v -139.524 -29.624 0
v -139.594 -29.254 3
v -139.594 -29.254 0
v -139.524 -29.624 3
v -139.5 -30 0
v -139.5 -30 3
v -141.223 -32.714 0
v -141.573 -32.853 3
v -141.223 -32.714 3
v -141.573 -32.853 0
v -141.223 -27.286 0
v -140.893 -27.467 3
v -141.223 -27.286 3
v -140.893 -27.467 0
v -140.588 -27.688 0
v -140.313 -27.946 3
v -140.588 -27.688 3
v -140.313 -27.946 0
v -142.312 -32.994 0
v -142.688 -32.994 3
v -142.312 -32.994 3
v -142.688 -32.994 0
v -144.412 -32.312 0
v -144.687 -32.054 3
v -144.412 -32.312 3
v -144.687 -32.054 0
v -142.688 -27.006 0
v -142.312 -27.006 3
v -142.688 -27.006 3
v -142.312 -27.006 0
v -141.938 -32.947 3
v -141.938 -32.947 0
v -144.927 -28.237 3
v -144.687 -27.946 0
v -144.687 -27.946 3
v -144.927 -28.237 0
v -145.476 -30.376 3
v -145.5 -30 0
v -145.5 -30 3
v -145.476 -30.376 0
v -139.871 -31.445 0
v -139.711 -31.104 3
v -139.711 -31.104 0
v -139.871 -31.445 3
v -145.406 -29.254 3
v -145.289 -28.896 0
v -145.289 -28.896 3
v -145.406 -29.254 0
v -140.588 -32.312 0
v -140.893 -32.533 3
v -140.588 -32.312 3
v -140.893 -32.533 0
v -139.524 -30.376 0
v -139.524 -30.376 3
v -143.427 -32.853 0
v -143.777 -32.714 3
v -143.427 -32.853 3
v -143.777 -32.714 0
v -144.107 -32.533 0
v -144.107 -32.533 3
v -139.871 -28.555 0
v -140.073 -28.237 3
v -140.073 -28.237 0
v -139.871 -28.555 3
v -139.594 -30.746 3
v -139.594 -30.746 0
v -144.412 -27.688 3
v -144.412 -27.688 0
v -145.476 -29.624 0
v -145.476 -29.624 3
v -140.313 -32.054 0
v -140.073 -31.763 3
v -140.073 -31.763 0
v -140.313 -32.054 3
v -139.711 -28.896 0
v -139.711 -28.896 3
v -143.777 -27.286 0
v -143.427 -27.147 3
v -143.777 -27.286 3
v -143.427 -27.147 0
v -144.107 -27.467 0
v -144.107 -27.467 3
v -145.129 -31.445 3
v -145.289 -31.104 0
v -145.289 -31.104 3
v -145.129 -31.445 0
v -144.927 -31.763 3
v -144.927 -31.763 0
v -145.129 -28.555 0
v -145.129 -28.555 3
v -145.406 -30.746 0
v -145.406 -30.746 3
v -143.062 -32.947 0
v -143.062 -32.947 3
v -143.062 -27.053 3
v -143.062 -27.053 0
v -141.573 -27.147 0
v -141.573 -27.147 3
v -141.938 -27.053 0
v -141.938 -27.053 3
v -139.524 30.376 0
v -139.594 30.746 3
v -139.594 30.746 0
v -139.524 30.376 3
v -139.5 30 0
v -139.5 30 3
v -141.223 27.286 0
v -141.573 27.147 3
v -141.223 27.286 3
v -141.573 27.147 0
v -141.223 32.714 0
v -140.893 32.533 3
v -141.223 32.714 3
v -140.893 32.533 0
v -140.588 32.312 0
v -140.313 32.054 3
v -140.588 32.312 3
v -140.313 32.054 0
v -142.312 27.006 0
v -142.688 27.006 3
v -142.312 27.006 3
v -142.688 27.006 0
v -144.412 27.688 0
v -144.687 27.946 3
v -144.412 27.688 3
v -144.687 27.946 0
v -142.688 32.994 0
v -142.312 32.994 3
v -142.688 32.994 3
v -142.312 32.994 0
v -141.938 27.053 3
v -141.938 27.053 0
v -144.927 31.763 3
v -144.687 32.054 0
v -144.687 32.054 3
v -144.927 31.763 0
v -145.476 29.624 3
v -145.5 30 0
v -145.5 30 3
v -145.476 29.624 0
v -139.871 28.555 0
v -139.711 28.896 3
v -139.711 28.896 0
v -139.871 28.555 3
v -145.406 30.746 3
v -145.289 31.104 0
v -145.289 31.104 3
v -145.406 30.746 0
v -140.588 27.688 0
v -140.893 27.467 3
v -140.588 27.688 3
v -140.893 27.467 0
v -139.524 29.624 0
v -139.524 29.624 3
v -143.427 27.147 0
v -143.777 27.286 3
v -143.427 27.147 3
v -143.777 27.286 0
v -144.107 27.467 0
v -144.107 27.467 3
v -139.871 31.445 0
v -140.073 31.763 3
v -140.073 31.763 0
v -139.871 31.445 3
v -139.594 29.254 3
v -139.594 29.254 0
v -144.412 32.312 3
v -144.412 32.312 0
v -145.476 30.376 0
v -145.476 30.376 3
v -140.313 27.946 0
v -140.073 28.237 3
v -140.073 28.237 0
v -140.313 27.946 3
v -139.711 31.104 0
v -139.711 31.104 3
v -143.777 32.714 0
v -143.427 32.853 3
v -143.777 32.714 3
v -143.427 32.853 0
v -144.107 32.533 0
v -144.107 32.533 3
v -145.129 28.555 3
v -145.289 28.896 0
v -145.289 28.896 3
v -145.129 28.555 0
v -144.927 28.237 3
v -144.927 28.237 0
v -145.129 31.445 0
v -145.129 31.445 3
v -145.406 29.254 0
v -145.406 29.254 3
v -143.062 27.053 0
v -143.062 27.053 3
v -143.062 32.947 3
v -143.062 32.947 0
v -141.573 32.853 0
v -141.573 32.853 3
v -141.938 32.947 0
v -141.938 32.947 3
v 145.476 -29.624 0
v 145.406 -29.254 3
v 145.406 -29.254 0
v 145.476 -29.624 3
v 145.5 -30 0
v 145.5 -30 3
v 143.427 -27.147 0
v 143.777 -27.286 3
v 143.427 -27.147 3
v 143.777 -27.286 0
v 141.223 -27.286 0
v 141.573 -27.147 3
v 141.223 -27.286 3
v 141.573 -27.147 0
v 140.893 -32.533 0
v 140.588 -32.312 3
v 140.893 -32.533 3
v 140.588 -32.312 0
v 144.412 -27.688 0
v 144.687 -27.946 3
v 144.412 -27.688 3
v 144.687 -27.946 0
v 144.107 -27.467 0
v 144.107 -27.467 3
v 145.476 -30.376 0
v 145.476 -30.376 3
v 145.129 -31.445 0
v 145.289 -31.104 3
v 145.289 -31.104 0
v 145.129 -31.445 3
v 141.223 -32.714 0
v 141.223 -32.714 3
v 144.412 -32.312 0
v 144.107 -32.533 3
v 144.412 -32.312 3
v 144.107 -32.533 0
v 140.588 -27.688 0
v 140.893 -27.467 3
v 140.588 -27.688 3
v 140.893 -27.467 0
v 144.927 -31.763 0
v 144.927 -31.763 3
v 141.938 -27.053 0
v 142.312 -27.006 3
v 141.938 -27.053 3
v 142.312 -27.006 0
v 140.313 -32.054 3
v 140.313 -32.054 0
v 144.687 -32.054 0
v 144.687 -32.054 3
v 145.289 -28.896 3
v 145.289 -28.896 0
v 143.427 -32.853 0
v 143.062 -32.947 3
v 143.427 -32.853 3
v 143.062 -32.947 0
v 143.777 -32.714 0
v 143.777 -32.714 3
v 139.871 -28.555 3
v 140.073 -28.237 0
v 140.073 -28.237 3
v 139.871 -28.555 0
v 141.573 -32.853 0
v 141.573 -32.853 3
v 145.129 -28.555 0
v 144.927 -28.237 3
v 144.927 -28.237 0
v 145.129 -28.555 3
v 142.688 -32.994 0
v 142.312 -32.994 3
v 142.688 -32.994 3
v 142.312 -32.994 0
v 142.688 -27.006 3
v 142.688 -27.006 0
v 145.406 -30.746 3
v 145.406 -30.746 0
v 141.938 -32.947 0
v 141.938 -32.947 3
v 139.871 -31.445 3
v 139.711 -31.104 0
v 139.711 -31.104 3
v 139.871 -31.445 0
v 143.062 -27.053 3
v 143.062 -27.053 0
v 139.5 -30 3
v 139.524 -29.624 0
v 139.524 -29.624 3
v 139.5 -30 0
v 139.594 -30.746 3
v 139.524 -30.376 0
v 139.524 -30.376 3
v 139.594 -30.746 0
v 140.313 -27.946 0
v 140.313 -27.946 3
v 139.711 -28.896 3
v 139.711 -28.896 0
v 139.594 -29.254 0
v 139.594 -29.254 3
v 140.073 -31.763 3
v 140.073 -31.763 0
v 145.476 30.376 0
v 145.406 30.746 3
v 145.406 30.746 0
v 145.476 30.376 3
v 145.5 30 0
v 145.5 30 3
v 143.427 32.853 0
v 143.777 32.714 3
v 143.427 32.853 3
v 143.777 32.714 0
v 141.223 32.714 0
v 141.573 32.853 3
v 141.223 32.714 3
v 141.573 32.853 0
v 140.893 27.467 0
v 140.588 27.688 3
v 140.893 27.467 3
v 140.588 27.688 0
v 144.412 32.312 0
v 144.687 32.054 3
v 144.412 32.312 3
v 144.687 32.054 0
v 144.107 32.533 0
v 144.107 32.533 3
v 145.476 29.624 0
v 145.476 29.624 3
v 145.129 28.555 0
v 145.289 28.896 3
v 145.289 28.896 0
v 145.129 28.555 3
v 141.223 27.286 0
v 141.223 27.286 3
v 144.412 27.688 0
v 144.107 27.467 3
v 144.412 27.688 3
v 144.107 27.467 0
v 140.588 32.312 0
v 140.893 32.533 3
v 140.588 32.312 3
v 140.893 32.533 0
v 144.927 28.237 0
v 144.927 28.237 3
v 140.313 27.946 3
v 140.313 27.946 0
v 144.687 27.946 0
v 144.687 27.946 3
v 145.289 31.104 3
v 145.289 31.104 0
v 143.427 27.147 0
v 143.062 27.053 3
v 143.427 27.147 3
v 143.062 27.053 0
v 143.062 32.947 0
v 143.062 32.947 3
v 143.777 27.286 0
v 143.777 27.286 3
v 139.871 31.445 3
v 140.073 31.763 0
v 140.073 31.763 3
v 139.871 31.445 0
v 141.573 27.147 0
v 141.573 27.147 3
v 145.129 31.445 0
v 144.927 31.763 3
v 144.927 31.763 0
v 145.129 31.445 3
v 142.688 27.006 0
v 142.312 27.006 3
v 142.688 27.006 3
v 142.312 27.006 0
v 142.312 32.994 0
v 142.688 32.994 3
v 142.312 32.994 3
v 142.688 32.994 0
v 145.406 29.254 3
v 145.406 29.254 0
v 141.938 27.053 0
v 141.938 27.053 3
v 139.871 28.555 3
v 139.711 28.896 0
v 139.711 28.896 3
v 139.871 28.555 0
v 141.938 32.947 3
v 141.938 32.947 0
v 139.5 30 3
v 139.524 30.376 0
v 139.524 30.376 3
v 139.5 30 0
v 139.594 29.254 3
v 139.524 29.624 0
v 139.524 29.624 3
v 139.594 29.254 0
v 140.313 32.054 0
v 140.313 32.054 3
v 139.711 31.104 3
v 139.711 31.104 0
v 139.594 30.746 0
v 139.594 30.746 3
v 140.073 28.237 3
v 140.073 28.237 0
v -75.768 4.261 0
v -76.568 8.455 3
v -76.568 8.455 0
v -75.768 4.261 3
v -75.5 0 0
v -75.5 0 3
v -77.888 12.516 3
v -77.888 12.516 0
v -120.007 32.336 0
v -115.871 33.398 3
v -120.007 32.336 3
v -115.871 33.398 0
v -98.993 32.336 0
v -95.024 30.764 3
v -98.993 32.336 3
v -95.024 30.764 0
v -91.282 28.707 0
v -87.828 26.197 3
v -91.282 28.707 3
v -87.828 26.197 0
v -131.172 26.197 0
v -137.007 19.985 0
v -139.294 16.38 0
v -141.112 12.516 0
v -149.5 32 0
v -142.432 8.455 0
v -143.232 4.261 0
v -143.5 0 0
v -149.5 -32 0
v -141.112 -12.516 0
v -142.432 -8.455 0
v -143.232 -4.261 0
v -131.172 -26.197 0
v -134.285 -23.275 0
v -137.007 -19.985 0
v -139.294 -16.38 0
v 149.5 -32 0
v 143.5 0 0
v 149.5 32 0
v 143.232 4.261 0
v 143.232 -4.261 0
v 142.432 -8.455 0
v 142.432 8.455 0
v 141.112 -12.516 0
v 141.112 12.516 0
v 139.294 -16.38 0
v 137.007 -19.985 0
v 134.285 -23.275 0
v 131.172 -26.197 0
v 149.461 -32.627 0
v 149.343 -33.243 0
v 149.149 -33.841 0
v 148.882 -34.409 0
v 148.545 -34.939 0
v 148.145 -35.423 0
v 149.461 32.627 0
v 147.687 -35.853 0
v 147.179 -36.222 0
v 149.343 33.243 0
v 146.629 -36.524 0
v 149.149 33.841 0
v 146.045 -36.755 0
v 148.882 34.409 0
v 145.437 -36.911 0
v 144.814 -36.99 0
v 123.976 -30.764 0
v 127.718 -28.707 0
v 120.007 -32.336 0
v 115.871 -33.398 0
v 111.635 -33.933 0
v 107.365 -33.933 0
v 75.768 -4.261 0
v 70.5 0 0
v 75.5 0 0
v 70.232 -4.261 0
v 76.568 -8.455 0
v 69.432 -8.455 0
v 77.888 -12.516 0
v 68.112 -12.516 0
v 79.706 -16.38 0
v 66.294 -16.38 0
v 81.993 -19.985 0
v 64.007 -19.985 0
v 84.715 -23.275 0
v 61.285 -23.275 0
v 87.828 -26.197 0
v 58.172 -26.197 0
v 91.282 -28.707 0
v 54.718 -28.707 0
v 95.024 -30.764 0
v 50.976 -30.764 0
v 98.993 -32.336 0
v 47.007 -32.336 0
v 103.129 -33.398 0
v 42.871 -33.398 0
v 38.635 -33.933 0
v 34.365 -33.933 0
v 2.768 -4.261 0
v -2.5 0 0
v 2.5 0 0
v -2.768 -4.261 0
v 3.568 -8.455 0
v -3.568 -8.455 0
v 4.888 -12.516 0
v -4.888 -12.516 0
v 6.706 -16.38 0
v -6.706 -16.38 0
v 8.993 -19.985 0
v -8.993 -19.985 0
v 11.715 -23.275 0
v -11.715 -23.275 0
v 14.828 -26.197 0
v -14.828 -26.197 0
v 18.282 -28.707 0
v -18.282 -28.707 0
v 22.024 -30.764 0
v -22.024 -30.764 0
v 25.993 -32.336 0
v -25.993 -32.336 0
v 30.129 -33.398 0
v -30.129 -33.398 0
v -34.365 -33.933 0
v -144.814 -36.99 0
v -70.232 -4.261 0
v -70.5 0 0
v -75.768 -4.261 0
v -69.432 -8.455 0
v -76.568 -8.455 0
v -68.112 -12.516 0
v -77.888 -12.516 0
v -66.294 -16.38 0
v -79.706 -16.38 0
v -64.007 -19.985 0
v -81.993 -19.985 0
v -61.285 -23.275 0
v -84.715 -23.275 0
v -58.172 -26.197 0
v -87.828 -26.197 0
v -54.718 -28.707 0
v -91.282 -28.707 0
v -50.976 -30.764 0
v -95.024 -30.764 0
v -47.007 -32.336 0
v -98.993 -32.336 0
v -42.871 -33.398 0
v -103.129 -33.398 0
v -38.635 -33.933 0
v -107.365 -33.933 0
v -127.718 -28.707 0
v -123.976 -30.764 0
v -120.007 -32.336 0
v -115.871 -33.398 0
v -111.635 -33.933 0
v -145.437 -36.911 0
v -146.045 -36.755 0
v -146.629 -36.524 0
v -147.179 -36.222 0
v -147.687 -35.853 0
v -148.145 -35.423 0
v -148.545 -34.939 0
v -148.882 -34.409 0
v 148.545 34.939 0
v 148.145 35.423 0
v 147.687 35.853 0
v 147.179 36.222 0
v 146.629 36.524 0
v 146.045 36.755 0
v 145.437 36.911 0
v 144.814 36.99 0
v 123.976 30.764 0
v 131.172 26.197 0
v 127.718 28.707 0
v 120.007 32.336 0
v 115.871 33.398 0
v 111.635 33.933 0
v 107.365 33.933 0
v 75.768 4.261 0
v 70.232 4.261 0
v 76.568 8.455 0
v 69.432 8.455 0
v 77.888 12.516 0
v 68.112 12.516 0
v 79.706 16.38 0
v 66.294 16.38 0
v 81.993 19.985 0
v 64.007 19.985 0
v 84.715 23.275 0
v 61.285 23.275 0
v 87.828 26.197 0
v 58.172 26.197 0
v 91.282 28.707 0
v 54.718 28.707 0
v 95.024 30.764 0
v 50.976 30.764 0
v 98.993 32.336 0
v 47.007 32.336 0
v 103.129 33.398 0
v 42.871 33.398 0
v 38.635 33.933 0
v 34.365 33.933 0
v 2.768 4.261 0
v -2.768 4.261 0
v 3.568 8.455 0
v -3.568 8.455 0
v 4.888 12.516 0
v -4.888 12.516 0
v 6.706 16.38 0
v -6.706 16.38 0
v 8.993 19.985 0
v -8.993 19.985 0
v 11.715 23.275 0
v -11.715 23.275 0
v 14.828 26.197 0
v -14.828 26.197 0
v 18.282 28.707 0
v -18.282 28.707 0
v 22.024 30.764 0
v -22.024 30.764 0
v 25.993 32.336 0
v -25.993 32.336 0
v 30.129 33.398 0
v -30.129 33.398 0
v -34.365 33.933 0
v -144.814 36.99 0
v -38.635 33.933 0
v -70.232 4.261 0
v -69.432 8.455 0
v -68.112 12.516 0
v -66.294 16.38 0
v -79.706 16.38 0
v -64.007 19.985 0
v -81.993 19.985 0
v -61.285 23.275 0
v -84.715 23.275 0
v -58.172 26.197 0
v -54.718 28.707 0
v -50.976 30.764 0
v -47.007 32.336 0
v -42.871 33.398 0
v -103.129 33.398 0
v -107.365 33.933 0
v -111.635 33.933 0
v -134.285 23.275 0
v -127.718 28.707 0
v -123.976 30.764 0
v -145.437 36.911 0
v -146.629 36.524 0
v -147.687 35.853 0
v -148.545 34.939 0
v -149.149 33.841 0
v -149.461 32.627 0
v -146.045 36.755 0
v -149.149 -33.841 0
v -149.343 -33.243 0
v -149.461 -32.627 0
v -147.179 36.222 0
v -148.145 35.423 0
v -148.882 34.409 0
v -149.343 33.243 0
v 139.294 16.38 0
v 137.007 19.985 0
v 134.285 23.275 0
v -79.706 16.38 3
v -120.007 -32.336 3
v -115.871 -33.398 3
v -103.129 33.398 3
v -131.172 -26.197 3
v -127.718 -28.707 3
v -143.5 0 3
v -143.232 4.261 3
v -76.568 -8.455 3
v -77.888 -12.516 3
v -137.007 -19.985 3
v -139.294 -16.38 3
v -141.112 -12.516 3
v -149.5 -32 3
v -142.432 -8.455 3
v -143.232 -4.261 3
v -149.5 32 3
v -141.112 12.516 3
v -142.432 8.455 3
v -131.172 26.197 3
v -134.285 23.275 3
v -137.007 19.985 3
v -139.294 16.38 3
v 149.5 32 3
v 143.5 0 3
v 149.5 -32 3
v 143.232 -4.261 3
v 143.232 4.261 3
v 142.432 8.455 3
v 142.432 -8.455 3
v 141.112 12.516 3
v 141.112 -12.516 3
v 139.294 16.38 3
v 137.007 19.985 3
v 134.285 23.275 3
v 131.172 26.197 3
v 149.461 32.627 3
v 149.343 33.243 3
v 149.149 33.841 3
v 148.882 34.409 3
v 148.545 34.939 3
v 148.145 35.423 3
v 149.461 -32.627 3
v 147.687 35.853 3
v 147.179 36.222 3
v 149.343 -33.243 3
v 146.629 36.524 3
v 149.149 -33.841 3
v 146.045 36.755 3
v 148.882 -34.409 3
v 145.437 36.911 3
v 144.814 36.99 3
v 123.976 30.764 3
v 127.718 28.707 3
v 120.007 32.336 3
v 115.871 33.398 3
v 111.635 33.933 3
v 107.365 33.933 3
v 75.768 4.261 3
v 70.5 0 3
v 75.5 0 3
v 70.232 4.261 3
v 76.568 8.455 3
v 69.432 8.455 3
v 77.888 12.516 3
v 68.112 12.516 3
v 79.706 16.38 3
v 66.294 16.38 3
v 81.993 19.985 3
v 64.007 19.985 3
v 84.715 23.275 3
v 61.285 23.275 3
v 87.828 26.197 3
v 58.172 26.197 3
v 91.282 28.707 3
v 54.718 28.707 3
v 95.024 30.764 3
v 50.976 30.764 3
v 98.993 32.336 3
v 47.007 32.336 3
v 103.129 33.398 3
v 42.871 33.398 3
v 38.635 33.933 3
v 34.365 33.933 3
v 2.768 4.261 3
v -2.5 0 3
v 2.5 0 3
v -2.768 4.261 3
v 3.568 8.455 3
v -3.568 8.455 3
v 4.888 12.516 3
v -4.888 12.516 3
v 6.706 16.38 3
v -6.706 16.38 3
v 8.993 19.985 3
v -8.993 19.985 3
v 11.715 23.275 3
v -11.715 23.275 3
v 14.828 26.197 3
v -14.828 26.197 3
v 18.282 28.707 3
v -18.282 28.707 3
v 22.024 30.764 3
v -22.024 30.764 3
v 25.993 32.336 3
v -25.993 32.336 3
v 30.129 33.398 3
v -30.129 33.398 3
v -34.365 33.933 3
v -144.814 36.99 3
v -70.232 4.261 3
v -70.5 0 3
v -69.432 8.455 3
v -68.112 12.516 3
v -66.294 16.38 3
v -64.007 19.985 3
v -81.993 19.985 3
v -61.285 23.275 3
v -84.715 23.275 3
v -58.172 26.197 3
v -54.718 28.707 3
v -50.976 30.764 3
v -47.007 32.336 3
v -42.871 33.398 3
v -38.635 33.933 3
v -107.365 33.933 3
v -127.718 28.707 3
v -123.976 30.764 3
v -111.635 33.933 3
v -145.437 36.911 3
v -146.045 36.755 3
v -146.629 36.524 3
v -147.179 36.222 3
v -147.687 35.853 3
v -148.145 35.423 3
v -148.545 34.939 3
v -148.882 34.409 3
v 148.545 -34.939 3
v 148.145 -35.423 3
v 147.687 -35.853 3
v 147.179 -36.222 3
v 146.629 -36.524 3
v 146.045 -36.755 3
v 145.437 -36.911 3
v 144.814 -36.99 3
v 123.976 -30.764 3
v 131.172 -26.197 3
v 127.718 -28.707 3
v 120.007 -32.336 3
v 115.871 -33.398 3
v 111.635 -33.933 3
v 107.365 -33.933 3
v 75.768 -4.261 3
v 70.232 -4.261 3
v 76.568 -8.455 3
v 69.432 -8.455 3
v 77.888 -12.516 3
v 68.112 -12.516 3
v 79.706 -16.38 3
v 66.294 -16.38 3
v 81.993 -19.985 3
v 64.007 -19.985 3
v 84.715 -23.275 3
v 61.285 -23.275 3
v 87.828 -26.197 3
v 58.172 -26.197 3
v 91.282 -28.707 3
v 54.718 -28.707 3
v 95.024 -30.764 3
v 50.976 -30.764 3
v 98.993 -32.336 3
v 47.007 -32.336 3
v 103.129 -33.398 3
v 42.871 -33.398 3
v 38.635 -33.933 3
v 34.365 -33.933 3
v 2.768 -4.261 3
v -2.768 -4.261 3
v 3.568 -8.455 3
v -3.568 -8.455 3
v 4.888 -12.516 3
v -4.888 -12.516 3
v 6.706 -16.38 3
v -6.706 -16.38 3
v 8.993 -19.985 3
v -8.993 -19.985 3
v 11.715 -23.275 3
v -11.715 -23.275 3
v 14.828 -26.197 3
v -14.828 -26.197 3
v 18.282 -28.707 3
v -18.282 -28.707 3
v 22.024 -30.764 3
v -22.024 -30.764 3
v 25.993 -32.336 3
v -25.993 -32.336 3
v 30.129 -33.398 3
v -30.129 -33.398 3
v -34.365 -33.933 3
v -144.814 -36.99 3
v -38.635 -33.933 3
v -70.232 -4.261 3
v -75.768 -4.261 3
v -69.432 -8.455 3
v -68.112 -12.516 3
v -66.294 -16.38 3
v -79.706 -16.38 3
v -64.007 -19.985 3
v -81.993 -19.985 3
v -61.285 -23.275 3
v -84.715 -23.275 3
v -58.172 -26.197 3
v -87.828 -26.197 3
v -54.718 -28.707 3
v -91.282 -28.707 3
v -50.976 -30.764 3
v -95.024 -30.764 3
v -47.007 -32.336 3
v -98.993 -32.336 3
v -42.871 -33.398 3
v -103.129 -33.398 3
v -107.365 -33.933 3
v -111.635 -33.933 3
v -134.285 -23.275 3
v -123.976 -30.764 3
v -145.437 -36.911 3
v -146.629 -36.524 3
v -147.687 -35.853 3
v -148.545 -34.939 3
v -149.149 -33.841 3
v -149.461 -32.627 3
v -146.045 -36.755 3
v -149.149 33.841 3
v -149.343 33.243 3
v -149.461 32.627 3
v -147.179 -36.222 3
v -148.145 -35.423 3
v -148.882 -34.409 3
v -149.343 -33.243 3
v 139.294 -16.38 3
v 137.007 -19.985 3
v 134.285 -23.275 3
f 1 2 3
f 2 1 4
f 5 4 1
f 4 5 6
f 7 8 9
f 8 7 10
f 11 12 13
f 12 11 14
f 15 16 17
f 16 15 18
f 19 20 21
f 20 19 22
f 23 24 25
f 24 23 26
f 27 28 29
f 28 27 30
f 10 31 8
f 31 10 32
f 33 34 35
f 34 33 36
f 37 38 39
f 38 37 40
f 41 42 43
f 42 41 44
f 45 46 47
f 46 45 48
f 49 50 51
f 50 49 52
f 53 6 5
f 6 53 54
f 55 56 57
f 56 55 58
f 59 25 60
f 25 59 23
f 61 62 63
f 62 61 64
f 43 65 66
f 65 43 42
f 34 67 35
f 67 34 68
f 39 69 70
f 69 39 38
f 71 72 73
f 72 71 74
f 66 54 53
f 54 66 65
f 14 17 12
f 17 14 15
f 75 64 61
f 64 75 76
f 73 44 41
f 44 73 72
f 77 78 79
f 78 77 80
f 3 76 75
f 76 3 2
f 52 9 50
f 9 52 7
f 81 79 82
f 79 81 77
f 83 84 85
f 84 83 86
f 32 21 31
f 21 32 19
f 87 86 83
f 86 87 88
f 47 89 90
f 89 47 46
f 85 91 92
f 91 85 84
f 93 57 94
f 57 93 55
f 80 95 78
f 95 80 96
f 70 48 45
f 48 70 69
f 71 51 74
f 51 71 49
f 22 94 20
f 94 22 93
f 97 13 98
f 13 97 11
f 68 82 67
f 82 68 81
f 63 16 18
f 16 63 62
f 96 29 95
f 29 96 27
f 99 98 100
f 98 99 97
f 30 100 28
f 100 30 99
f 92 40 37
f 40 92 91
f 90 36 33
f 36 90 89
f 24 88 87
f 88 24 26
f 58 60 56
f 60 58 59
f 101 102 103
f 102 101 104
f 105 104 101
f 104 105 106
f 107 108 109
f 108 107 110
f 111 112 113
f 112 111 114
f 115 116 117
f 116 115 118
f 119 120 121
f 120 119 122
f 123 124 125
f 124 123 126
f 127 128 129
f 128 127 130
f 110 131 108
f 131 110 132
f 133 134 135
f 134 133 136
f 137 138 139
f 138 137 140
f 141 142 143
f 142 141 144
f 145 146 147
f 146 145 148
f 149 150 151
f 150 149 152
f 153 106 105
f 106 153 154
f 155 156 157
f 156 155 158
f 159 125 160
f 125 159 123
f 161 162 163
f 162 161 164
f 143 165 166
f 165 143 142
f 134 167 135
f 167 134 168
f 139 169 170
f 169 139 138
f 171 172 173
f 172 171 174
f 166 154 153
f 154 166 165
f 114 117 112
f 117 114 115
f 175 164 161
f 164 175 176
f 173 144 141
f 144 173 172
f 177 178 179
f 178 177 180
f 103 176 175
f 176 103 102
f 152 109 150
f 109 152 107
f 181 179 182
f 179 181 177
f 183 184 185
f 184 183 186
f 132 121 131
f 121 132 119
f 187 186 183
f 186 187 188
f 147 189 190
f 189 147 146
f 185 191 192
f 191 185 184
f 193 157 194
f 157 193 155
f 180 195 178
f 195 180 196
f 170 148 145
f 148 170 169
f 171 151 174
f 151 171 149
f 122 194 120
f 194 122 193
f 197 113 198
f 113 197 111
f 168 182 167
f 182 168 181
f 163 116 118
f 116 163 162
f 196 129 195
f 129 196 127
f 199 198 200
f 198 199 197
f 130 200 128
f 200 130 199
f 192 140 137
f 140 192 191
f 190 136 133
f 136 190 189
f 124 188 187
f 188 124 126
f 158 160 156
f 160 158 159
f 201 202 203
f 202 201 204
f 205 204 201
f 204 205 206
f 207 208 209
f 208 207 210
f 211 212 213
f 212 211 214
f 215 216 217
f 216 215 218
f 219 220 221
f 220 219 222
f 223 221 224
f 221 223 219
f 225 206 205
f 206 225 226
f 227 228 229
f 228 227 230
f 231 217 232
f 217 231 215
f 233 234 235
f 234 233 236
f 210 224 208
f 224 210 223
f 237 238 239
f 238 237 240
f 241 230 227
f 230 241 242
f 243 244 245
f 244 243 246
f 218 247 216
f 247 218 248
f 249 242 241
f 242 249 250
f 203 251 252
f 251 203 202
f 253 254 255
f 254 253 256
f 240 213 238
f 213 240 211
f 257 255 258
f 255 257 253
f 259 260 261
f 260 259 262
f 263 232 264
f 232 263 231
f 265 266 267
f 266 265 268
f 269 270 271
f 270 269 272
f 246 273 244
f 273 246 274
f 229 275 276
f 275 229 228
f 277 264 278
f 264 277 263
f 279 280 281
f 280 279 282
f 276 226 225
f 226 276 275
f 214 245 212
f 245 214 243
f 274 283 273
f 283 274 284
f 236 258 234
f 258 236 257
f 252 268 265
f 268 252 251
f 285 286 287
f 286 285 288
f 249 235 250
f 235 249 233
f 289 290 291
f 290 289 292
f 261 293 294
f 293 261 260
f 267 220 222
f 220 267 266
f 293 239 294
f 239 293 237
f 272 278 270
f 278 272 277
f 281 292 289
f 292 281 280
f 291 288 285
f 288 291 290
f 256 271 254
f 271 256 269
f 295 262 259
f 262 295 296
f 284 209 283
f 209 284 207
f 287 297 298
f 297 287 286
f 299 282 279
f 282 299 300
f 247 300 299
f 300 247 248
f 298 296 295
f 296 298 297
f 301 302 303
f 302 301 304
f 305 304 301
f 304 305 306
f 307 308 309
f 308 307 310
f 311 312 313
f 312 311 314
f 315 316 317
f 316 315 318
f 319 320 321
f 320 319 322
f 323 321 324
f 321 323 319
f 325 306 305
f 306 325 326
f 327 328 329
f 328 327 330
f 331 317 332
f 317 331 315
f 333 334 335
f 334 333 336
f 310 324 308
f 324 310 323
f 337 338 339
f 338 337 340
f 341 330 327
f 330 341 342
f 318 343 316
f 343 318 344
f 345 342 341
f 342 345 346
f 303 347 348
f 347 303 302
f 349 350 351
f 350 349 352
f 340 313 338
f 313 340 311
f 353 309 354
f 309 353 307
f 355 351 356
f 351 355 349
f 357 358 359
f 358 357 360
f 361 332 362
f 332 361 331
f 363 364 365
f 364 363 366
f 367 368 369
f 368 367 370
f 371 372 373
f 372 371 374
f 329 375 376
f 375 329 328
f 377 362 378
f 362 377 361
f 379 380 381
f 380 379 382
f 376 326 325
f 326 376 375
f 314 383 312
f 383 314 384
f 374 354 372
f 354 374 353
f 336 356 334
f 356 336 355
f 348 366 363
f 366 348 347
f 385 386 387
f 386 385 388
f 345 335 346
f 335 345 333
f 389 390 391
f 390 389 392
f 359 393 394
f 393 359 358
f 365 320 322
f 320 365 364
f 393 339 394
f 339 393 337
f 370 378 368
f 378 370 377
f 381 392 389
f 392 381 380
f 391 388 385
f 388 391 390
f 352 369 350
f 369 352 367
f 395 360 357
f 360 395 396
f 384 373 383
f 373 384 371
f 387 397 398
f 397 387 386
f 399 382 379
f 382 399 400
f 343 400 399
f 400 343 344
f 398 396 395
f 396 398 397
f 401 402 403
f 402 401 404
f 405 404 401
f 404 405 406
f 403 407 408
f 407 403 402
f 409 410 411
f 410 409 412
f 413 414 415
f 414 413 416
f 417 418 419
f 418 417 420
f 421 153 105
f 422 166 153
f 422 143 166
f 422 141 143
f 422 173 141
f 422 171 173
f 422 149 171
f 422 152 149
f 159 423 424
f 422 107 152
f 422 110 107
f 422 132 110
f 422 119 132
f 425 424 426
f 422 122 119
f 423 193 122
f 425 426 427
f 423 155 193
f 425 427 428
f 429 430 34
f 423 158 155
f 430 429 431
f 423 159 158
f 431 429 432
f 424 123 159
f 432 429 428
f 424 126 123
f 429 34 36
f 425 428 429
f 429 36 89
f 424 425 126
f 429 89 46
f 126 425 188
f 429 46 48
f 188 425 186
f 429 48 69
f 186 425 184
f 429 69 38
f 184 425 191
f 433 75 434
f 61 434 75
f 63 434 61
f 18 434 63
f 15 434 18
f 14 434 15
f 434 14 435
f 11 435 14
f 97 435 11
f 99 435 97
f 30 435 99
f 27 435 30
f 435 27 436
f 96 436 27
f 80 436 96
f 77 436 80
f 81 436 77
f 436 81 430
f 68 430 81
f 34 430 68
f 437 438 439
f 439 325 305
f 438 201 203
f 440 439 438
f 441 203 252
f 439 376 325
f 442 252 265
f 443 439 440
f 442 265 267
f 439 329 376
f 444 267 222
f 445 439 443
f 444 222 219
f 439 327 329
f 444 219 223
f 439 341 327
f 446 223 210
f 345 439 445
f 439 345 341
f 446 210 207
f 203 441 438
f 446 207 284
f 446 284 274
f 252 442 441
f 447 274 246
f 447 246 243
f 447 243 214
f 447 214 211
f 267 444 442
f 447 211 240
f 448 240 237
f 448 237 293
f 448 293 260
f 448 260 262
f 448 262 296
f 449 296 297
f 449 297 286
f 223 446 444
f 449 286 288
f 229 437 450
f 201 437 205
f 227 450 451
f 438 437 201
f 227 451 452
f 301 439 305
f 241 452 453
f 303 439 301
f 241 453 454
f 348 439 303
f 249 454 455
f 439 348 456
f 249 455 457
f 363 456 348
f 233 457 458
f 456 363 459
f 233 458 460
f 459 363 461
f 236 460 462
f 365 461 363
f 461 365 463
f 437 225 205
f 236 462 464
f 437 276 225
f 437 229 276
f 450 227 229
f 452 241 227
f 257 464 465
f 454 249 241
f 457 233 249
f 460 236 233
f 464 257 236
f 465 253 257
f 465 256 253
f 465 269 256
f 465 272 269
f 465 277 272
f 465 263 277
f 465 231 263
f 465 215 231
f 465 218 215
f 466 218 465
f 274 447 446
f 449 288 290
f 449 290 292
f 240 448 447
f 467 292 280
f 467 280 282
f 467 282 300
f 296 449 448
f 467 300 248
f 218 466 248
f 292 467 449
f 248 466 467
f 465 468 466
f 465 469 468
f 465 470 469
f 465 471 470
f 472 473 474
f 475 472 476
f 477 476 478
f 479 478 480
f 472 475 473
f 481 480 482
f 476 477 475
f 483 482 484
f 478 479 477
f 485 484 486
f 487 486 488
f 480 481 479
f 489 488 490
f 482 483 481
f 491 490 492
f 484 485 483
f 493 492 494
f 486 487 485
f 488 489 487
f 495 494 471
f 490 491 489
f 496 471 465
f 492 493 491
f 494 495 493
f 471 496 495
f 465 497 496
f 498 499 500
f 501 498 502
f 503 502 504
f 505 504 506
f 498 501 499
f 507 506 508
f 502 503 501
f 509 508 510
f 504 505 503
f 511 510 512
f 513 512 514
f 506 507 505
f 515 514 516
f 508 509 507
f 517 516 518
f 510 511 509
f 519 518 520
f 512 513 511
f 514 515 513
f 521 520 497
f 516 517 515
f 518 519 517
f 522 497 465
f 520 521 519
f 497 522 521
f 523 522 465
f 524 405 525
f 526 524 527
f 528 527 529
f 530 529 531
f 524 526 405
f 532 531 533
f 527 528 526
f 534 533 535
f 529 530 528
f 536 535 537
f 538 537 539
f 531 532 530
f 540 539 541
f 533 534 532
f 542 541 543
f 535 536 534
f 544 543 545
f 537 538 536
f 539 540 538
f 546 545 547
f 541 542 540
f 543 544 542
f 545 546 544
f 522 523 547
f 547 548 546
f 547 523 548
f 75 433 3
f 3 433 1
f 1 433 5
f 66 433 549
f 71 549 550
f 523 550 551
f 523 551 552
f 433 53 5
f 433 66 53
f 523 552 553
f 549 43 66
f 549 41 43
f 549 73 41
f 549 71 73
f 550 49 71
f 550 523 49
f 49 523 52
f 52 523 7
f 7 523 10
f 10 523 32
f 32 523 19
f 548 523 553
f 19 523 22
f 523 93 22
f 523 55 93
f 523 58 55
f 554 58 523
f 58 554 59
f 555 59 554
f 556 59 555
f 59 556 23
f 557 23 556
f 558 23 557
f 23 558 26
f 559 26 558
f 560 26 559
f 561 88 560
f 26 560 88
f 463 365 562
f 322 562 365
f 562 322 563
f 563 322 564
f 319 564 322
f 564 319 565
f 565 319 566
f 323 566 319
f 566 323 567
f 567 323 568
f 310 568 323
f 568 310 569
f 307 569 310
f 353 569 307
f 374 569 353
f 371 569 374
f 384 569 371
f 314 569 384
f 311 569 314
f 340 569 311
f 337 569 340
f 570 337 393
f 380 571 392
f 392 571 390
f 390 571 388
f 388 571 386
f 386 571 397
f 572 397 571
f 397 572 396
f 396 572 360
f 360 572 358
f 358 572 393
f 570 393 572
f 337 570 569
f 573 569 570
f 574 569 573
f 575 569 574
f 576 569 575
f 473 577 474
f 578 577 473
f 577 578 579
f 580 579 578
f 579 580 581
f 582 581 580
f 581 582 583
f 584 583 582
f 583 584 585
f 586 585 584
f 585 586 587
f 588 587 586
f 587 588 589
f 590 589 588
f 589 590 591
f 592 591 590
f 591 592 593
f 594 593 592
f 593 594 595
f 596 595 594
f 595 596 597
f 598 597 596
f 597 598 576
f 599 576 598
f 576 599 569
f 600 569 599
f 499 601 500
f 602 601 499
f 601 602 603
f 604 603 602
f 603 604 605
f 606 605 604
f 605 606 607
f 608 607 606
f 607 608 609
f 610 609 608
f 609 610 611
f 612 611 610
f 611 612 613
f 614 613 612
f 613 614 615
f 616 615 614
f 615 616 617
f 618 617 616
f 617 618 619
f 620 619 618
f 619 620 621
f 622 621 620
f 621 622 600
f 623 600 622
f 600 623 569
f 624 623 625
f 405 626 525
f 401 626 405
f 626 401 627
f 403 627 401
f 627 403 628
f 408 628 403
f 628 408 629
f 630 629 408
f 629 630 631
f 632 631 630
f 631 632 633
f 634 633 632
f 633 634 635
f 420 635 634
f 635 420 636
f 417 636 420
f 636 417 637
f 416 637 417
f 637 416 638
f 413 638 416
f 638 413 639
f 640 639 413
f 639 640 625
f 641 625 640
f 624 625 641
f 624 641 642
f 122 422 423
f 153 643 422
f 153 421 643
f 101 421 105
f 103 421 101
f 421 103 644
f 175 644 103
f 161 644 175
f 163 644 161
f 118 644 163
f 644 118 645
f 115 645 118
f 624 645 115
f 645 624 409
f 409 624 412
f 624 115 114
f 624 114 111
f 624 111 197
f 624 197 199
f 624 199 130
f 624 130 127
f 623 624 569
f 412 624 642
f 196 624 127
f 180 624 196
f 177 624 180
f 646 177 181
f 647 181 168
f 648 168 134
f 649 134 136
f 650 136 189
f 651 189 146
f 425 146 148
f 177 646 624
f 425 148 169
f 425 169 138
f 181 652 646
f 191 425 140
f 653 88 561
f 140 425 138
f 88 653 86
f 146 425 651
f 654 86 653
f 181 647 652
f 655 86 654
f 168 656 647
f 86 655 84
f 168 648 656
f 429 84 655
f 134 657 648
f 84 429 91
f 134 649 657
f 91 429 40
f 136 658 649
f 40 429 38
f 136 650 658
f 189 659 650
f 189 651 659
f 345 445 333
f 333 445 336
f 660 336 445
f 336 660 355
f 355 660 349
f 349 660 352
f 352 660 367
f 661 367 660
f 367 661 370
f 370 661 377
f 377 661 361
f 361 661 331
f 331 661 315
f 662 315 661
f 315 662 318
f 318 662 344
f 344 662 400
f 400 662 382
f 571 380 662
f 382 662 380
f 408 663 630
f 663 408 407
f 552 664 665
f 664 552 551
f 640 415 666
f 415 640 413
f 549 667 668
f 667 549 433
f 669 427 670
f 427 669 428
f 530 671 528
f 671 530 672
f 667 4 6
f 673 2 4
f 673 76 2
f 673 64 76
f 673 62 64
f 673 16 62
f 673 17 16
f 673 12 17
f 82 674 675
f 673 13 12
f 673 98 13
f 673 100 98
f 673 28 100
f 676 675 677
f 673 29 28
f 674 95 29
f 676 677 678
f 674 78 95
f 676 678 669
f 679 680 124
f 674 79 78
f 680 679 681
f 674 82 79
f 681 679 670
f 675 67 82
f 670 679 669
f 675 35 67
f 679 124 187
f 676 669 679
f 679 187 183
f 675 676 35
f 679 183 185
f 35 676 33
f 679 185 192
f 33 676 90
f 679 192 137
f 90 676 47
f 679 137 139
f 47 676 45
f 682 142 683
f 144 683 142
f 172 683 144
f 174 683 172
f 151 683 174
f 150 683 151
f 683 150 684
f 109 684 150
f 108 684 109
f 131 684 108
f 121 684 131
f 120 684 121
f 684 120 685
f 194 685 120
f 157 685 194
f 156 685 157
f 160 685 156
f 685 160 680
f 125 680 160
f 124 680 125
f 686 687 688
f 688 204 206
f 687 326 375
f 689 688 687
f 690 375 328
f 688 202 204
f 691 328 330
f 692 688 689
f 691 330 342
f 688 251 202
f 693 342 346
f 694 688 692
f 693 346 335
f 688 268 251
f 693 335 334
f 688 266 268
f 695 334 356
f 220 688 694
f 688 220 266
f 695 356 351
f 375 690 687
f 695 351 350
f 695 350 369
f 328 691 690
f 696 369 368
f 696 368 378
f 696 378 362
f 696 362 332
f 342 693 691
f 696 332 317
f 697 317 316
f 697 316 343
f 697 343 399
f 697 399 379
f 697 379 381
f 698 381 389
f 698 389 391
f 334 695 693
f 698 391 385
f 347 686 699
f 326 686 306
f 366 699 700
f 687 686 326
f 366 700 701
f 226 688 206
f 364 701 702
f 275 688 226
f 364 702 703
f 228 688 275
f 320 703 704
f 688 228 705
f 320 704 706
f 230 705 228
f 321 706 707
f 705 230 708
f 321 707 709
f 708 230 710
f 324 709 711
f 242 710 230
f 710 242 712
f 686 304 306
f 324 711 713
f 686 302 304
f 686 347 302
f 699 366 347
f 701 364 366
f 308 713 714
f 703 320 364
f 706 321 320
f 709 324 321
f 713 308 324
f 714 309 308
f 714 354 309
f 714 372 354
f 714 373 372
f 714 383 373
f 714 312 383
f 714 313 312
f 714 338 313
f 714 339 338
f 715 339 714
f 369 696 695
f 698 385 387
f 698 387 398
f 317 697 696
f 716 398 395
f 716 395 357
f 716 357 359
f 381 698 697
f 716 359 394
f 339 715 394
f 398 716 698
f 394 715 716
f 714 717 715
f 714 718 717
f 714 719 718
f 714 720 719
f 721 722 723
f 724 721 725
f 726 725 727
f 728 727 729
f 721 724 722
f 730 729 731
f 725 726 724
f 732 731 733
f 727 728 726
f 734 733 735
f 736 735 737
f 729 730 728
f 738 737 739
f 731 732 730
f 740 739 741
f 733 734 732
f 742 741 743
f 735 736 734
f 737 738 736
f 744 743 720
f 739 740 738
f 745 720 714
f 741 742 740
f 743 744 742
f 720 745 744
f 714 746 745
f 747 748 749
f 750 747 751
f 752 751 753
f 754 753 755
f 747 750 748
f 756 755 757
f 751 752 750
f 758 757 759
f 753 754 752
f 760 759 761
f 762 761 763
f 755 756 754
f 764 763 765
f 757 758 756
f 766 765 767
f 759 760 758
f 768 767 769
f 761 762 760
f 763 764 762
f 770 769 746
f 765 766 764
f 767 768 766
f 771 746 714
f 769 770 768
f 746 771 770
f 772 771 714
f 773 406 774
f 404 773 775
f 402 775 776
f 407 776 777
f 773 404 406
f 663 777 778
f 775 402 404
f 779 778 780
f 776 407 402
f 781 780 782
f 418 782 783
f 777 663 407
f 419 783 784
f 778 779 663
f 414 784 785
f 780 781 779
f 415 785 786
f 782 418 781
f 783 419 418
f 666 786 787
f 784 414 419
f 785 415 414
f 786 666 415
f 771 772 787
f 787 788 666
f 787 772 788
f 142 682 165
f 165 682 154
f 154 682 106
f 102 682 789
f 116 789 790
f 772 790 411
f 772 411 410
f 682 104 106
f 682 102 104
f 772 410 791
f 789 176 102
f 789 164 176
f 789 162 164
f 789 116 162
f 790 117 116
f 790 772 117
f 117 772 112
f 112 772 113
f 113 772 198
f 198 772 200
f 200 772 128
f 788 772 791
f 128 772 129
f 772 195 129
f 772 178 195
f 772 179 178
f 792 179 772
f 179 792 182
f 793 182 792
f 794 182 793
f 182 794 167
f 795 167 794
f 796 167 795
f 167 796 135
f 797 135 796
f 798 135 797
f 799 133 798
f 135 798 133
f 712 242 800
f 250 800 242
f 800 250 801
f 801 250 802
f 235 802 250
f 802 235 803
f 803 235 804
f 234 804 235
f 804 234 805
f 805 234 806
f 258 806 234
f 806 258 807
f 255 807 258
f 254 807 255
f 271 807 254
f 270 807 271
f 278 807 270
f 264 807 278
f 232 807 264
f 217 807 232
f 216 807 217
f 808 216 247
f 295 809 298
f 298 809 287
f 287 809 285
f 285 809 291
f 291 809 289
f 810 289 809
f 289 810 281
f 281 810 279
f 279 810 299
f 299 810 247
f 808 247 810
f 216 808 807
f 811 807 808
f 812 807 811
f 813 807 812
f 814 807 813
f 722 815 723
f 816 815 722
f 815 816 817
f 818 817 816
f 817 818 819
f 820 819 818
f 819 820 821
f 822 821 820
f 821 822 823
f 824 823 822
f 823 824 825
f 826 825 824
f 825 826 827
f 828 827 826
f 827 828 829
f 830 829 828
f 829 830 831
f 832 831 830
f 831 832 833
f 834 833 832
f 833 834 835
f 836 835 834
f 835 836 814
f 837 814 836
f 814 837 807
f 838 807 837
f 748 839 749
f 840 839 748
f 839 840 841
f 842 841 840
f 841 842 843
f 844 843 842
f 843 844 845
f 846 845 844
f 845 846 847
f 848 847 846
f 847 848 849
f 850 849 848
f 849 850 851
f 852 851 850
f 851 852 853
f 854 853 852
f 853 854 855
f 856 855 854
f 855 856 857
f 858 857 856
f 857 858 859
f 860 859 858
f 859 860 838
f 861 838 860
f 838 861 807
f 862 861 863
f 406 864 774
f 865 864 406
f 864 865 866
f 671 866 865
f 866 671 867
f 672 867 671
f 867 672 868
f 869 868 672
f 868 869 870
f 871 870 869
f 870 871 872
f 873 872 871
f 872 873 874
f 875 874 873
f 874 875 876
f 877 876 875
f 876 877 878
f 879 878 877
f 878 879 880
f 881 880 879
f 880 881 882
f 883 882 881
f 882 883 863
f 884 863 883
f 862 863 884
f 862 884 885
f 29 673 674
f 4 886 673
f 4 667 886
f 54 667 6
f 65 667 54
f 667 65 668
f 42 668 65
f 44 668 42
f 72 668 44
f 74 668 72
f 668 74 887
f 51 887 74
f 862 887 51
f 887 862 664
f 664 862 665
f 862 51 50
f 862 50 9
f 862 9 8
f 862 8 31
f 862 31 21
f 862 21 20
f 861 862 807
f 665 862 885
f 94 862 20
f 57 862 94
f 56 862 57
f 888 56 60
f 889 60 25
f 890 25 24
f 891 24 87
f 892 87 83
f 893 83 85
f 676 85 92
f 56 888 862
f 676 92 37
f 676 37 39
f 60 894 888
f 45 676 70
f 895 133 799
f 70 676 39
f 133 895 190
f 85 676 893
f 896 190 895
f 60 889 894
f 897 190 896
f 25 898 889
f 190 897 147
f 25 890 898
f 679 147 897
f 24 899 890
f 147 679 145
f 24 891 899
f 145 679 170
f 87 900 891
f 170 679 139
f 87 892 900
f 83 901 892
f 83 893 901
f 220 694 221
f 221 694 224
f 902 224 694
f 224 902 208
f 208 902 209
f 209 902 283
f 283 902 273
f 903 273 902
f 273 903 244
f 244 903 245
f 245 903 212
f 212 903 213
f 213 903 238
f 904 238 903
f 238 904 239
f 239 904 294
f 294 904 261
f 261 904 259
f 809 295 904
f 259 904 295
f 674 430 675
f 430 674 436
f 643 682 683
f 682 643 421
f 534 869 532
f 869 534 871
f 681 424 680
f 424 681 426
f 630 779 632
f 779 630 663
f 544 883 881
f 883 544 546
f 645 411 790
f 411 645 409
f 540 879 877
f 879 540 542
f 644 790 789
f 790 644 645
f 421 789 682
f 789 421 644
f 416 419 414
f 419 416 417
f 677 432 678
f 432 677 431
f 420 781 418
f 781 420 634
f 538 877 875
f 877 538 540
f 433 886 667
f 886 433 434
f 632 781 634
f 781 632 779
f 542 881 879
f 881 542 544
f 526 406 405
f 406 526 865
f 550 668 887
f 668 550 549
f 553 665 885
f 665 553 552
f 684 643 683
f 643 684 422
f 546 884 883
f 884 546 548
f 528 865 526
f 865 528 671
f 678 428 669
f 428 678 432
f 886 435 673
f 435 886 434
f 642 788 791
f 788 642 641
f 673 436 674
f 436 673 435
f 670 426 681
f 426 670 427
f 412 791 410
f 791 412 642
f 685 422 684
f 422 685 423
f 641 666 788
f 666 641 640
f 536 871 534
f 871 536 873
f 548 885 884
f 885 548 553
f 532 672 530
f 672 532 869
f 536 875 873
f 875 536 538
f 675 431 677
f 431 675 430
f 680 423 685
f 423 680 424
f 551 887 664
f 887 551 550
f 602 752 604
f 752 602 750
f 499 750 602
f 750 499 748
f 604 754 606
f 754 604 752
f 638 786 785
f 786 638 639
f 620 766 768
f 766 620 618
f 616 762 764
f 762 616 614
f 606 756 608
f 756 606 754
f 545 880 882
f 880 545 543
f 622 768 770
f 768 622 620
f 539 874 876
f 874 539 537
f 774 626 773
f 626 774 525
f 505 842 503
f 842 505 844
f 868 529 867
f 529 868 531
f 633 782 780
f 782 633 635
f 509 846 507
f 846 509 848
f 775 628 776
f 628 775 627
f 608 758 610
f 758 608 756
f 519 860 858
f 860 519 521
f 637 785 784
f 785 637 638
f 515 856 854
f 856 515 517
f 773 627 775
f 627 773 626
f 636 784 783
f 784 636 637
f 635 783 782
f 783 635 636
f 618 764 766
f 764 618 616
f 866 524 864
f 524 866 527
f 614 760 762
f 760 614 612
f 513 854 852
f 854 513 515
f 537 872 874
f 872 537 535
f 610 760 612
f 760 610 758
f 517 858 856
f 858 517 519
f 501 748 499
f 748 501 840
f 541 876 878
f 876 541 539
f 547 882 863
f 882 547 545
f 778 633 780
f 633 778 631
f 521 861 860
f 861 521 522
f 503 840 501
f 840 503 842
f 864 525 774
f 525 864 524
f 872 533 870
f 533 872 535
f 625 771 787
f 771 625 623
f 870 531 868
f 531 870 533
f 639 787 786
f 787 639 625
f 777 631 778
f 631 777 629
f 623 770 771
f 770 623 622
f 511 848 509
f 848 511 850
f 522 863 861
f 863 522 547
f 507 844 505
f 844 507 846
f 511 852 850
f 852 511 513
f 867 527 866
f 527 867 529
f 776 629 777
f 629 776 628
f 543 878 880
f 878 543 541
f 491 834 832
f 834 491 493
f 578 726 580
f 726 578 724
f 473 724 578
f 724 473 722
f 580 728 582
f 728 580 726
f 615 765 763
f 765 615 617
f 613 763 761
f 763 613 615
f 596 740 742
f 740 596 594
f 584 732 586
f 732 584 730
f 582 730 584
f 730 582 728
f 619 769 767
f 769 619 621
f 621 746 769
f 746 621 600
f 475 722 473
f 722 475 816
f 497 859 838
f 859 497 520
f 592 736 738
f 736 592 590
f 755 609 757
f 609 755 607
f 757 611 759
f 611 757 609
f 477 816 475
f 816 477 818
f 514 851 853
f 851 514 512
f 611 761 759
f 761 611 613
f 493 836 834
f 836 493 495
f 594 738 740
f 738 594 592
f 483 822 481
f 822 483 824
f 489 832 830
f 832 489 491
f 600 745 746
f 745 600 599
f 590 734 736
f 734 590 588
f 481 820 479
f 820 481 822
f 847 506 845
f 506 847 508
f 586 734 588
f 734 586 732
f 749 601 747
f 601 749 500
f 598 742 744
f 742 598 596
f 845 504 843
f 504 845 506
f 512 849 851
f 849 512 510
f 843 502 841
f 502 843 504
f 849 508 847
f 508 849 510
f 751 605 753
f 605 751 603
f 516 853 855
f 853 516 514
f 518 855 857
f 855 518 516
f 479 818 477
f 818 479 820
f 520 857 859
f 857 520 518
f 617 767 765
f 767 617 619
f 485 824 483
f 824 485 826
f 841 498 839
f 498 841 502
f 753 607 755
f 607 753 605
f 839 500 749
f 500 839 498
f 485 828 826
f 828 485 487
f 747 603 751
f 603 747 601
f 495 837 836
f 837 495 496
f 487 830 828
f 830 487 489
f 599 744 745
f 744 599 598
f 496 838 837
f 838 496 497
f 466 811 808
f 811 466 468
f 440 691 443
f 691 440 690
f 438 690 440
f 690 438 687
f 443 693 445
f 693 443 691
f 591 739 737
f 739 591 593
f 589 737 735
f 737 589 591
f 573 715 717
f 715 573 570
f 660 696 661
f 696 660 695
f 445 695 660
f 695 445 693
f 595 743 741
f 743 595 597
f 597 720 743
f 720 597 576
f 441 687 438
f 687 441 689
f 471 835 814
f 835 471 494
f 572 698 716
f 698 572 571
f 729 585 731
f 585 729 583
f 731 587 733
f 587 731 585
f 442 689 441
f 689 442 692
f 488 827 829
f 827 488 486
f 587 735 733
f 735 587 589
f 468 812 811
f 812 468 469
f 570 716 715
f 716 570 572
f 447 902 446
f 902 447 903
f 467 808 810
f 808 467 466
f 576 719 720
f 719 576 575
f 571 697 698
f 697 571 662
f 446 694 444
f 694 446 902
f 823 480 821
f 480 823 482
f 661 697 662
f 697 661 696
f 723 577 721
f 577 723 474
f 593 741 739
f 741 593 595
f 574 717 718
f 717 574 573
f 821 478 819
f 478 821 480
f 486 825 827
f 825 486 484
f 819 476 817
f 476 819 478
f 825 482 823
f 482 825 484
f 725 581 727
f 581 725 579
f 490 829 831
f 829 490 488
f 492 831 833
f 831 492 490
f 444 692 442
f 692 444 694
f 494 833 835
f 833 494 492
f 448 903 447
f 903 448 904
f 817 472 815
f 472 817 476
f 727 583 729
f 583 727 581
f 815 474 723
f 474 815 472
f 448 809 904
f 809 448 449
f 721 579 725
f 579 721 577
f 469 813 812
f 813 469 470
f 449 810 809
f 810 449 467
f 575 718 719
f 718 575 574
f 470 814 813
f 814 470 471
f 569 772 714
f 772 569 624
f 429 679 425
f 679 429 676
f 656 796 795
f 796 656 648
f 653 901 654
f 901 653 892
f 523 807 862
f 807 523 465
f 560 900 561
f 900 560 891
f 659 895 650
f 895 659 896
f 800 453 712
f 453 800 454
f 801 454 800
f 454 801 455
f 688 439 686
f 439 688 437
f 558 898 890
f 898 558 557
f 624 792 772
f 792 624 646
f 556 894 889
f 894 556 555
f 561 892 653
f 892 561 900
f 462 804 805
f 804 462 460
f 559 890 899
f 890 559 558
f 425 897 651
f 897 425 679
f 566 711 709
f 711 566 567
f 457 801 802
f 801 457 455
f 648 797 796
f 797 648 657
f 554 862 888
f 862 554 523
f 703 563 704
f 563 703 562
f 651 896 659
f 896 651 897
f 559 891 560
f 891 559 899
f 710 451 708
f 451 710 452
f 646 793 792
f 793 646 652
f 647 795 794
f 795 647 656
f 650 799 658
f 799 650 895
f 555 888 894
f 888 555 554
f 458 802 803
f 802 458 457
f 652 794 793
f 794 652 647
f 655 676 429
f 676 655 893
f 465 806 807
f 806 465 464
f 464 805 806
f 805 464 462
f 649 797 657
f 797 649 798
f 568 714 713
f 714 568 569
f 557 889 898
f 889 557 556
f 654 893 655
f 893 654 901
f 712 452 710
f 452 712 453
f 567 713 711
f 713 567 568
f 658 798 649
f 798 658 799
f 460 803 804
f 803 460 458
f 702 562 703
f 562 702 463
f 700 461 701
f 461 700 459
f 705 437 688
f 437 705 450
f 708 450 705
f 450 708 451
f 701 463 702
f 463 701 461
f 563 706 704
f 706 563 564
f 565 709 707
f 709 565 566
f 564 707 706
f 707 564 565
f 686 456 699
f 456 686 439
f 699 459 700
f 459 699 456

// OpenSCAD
$fn = 50;


difference() {
	union() {
		hull() {
			translate(v = [-144.5000000000, 32.0000000000, 0]) {
				cylinder(h = 3, r = 5);
			}
			translate(v = [144.5000000000, 32.0000000000, 0]) {
				cylinder(h = 3, r = 5);
			}
			translate(v = [-144.5000000000, -32.0000000000, 0]) {
				cylinder(h = 3, r = 5);
			}
			translate(v = [144.5000000000, -32.0000000000, 0]) {
				cylinder(h = 3, r = 5);
			}
		}
	}
	union() {
		#translate(v = [-142.5000000000, -30.0000000000, -100.0000000000]) {
			cylinder(h = 200, r = 3.0000000000);
		}
		#translate(v = [-142.5000000000, 30.0000000000, -100.0000000000]) {
			cylinder(h = 200, r = 3.0000000000);
		}
		#translate(v = [142.5000000000, -30.0000000000, -100.0000000000]) {
			cylinder(h = 200, r = 3.0000000000);
		}
		#translate(v = [142.5000000000, 30.0000000000, -100.0000000000]) {
			cylinder(h = 200, r = 3.0000000000);
		}
		#translate(v = [-109.5000000000, 0, 0]) {
			cylinder(h = 3, r = 34.0000000000);
		}
		#translate(v = [-36.5000000000, 0, 0]) {
			cylinder(h = 3, r = 34.0000000000);
		}
		#translate(v = [36.5000000000, 0, 0]) {
			cylinder(h = 3, r = 34.0000000000);
		}
		#translate(v = [109.5000000000, 0, 0]) {
			cylinder(h = 3, r = 34.0000000000);
		}
	}
}
